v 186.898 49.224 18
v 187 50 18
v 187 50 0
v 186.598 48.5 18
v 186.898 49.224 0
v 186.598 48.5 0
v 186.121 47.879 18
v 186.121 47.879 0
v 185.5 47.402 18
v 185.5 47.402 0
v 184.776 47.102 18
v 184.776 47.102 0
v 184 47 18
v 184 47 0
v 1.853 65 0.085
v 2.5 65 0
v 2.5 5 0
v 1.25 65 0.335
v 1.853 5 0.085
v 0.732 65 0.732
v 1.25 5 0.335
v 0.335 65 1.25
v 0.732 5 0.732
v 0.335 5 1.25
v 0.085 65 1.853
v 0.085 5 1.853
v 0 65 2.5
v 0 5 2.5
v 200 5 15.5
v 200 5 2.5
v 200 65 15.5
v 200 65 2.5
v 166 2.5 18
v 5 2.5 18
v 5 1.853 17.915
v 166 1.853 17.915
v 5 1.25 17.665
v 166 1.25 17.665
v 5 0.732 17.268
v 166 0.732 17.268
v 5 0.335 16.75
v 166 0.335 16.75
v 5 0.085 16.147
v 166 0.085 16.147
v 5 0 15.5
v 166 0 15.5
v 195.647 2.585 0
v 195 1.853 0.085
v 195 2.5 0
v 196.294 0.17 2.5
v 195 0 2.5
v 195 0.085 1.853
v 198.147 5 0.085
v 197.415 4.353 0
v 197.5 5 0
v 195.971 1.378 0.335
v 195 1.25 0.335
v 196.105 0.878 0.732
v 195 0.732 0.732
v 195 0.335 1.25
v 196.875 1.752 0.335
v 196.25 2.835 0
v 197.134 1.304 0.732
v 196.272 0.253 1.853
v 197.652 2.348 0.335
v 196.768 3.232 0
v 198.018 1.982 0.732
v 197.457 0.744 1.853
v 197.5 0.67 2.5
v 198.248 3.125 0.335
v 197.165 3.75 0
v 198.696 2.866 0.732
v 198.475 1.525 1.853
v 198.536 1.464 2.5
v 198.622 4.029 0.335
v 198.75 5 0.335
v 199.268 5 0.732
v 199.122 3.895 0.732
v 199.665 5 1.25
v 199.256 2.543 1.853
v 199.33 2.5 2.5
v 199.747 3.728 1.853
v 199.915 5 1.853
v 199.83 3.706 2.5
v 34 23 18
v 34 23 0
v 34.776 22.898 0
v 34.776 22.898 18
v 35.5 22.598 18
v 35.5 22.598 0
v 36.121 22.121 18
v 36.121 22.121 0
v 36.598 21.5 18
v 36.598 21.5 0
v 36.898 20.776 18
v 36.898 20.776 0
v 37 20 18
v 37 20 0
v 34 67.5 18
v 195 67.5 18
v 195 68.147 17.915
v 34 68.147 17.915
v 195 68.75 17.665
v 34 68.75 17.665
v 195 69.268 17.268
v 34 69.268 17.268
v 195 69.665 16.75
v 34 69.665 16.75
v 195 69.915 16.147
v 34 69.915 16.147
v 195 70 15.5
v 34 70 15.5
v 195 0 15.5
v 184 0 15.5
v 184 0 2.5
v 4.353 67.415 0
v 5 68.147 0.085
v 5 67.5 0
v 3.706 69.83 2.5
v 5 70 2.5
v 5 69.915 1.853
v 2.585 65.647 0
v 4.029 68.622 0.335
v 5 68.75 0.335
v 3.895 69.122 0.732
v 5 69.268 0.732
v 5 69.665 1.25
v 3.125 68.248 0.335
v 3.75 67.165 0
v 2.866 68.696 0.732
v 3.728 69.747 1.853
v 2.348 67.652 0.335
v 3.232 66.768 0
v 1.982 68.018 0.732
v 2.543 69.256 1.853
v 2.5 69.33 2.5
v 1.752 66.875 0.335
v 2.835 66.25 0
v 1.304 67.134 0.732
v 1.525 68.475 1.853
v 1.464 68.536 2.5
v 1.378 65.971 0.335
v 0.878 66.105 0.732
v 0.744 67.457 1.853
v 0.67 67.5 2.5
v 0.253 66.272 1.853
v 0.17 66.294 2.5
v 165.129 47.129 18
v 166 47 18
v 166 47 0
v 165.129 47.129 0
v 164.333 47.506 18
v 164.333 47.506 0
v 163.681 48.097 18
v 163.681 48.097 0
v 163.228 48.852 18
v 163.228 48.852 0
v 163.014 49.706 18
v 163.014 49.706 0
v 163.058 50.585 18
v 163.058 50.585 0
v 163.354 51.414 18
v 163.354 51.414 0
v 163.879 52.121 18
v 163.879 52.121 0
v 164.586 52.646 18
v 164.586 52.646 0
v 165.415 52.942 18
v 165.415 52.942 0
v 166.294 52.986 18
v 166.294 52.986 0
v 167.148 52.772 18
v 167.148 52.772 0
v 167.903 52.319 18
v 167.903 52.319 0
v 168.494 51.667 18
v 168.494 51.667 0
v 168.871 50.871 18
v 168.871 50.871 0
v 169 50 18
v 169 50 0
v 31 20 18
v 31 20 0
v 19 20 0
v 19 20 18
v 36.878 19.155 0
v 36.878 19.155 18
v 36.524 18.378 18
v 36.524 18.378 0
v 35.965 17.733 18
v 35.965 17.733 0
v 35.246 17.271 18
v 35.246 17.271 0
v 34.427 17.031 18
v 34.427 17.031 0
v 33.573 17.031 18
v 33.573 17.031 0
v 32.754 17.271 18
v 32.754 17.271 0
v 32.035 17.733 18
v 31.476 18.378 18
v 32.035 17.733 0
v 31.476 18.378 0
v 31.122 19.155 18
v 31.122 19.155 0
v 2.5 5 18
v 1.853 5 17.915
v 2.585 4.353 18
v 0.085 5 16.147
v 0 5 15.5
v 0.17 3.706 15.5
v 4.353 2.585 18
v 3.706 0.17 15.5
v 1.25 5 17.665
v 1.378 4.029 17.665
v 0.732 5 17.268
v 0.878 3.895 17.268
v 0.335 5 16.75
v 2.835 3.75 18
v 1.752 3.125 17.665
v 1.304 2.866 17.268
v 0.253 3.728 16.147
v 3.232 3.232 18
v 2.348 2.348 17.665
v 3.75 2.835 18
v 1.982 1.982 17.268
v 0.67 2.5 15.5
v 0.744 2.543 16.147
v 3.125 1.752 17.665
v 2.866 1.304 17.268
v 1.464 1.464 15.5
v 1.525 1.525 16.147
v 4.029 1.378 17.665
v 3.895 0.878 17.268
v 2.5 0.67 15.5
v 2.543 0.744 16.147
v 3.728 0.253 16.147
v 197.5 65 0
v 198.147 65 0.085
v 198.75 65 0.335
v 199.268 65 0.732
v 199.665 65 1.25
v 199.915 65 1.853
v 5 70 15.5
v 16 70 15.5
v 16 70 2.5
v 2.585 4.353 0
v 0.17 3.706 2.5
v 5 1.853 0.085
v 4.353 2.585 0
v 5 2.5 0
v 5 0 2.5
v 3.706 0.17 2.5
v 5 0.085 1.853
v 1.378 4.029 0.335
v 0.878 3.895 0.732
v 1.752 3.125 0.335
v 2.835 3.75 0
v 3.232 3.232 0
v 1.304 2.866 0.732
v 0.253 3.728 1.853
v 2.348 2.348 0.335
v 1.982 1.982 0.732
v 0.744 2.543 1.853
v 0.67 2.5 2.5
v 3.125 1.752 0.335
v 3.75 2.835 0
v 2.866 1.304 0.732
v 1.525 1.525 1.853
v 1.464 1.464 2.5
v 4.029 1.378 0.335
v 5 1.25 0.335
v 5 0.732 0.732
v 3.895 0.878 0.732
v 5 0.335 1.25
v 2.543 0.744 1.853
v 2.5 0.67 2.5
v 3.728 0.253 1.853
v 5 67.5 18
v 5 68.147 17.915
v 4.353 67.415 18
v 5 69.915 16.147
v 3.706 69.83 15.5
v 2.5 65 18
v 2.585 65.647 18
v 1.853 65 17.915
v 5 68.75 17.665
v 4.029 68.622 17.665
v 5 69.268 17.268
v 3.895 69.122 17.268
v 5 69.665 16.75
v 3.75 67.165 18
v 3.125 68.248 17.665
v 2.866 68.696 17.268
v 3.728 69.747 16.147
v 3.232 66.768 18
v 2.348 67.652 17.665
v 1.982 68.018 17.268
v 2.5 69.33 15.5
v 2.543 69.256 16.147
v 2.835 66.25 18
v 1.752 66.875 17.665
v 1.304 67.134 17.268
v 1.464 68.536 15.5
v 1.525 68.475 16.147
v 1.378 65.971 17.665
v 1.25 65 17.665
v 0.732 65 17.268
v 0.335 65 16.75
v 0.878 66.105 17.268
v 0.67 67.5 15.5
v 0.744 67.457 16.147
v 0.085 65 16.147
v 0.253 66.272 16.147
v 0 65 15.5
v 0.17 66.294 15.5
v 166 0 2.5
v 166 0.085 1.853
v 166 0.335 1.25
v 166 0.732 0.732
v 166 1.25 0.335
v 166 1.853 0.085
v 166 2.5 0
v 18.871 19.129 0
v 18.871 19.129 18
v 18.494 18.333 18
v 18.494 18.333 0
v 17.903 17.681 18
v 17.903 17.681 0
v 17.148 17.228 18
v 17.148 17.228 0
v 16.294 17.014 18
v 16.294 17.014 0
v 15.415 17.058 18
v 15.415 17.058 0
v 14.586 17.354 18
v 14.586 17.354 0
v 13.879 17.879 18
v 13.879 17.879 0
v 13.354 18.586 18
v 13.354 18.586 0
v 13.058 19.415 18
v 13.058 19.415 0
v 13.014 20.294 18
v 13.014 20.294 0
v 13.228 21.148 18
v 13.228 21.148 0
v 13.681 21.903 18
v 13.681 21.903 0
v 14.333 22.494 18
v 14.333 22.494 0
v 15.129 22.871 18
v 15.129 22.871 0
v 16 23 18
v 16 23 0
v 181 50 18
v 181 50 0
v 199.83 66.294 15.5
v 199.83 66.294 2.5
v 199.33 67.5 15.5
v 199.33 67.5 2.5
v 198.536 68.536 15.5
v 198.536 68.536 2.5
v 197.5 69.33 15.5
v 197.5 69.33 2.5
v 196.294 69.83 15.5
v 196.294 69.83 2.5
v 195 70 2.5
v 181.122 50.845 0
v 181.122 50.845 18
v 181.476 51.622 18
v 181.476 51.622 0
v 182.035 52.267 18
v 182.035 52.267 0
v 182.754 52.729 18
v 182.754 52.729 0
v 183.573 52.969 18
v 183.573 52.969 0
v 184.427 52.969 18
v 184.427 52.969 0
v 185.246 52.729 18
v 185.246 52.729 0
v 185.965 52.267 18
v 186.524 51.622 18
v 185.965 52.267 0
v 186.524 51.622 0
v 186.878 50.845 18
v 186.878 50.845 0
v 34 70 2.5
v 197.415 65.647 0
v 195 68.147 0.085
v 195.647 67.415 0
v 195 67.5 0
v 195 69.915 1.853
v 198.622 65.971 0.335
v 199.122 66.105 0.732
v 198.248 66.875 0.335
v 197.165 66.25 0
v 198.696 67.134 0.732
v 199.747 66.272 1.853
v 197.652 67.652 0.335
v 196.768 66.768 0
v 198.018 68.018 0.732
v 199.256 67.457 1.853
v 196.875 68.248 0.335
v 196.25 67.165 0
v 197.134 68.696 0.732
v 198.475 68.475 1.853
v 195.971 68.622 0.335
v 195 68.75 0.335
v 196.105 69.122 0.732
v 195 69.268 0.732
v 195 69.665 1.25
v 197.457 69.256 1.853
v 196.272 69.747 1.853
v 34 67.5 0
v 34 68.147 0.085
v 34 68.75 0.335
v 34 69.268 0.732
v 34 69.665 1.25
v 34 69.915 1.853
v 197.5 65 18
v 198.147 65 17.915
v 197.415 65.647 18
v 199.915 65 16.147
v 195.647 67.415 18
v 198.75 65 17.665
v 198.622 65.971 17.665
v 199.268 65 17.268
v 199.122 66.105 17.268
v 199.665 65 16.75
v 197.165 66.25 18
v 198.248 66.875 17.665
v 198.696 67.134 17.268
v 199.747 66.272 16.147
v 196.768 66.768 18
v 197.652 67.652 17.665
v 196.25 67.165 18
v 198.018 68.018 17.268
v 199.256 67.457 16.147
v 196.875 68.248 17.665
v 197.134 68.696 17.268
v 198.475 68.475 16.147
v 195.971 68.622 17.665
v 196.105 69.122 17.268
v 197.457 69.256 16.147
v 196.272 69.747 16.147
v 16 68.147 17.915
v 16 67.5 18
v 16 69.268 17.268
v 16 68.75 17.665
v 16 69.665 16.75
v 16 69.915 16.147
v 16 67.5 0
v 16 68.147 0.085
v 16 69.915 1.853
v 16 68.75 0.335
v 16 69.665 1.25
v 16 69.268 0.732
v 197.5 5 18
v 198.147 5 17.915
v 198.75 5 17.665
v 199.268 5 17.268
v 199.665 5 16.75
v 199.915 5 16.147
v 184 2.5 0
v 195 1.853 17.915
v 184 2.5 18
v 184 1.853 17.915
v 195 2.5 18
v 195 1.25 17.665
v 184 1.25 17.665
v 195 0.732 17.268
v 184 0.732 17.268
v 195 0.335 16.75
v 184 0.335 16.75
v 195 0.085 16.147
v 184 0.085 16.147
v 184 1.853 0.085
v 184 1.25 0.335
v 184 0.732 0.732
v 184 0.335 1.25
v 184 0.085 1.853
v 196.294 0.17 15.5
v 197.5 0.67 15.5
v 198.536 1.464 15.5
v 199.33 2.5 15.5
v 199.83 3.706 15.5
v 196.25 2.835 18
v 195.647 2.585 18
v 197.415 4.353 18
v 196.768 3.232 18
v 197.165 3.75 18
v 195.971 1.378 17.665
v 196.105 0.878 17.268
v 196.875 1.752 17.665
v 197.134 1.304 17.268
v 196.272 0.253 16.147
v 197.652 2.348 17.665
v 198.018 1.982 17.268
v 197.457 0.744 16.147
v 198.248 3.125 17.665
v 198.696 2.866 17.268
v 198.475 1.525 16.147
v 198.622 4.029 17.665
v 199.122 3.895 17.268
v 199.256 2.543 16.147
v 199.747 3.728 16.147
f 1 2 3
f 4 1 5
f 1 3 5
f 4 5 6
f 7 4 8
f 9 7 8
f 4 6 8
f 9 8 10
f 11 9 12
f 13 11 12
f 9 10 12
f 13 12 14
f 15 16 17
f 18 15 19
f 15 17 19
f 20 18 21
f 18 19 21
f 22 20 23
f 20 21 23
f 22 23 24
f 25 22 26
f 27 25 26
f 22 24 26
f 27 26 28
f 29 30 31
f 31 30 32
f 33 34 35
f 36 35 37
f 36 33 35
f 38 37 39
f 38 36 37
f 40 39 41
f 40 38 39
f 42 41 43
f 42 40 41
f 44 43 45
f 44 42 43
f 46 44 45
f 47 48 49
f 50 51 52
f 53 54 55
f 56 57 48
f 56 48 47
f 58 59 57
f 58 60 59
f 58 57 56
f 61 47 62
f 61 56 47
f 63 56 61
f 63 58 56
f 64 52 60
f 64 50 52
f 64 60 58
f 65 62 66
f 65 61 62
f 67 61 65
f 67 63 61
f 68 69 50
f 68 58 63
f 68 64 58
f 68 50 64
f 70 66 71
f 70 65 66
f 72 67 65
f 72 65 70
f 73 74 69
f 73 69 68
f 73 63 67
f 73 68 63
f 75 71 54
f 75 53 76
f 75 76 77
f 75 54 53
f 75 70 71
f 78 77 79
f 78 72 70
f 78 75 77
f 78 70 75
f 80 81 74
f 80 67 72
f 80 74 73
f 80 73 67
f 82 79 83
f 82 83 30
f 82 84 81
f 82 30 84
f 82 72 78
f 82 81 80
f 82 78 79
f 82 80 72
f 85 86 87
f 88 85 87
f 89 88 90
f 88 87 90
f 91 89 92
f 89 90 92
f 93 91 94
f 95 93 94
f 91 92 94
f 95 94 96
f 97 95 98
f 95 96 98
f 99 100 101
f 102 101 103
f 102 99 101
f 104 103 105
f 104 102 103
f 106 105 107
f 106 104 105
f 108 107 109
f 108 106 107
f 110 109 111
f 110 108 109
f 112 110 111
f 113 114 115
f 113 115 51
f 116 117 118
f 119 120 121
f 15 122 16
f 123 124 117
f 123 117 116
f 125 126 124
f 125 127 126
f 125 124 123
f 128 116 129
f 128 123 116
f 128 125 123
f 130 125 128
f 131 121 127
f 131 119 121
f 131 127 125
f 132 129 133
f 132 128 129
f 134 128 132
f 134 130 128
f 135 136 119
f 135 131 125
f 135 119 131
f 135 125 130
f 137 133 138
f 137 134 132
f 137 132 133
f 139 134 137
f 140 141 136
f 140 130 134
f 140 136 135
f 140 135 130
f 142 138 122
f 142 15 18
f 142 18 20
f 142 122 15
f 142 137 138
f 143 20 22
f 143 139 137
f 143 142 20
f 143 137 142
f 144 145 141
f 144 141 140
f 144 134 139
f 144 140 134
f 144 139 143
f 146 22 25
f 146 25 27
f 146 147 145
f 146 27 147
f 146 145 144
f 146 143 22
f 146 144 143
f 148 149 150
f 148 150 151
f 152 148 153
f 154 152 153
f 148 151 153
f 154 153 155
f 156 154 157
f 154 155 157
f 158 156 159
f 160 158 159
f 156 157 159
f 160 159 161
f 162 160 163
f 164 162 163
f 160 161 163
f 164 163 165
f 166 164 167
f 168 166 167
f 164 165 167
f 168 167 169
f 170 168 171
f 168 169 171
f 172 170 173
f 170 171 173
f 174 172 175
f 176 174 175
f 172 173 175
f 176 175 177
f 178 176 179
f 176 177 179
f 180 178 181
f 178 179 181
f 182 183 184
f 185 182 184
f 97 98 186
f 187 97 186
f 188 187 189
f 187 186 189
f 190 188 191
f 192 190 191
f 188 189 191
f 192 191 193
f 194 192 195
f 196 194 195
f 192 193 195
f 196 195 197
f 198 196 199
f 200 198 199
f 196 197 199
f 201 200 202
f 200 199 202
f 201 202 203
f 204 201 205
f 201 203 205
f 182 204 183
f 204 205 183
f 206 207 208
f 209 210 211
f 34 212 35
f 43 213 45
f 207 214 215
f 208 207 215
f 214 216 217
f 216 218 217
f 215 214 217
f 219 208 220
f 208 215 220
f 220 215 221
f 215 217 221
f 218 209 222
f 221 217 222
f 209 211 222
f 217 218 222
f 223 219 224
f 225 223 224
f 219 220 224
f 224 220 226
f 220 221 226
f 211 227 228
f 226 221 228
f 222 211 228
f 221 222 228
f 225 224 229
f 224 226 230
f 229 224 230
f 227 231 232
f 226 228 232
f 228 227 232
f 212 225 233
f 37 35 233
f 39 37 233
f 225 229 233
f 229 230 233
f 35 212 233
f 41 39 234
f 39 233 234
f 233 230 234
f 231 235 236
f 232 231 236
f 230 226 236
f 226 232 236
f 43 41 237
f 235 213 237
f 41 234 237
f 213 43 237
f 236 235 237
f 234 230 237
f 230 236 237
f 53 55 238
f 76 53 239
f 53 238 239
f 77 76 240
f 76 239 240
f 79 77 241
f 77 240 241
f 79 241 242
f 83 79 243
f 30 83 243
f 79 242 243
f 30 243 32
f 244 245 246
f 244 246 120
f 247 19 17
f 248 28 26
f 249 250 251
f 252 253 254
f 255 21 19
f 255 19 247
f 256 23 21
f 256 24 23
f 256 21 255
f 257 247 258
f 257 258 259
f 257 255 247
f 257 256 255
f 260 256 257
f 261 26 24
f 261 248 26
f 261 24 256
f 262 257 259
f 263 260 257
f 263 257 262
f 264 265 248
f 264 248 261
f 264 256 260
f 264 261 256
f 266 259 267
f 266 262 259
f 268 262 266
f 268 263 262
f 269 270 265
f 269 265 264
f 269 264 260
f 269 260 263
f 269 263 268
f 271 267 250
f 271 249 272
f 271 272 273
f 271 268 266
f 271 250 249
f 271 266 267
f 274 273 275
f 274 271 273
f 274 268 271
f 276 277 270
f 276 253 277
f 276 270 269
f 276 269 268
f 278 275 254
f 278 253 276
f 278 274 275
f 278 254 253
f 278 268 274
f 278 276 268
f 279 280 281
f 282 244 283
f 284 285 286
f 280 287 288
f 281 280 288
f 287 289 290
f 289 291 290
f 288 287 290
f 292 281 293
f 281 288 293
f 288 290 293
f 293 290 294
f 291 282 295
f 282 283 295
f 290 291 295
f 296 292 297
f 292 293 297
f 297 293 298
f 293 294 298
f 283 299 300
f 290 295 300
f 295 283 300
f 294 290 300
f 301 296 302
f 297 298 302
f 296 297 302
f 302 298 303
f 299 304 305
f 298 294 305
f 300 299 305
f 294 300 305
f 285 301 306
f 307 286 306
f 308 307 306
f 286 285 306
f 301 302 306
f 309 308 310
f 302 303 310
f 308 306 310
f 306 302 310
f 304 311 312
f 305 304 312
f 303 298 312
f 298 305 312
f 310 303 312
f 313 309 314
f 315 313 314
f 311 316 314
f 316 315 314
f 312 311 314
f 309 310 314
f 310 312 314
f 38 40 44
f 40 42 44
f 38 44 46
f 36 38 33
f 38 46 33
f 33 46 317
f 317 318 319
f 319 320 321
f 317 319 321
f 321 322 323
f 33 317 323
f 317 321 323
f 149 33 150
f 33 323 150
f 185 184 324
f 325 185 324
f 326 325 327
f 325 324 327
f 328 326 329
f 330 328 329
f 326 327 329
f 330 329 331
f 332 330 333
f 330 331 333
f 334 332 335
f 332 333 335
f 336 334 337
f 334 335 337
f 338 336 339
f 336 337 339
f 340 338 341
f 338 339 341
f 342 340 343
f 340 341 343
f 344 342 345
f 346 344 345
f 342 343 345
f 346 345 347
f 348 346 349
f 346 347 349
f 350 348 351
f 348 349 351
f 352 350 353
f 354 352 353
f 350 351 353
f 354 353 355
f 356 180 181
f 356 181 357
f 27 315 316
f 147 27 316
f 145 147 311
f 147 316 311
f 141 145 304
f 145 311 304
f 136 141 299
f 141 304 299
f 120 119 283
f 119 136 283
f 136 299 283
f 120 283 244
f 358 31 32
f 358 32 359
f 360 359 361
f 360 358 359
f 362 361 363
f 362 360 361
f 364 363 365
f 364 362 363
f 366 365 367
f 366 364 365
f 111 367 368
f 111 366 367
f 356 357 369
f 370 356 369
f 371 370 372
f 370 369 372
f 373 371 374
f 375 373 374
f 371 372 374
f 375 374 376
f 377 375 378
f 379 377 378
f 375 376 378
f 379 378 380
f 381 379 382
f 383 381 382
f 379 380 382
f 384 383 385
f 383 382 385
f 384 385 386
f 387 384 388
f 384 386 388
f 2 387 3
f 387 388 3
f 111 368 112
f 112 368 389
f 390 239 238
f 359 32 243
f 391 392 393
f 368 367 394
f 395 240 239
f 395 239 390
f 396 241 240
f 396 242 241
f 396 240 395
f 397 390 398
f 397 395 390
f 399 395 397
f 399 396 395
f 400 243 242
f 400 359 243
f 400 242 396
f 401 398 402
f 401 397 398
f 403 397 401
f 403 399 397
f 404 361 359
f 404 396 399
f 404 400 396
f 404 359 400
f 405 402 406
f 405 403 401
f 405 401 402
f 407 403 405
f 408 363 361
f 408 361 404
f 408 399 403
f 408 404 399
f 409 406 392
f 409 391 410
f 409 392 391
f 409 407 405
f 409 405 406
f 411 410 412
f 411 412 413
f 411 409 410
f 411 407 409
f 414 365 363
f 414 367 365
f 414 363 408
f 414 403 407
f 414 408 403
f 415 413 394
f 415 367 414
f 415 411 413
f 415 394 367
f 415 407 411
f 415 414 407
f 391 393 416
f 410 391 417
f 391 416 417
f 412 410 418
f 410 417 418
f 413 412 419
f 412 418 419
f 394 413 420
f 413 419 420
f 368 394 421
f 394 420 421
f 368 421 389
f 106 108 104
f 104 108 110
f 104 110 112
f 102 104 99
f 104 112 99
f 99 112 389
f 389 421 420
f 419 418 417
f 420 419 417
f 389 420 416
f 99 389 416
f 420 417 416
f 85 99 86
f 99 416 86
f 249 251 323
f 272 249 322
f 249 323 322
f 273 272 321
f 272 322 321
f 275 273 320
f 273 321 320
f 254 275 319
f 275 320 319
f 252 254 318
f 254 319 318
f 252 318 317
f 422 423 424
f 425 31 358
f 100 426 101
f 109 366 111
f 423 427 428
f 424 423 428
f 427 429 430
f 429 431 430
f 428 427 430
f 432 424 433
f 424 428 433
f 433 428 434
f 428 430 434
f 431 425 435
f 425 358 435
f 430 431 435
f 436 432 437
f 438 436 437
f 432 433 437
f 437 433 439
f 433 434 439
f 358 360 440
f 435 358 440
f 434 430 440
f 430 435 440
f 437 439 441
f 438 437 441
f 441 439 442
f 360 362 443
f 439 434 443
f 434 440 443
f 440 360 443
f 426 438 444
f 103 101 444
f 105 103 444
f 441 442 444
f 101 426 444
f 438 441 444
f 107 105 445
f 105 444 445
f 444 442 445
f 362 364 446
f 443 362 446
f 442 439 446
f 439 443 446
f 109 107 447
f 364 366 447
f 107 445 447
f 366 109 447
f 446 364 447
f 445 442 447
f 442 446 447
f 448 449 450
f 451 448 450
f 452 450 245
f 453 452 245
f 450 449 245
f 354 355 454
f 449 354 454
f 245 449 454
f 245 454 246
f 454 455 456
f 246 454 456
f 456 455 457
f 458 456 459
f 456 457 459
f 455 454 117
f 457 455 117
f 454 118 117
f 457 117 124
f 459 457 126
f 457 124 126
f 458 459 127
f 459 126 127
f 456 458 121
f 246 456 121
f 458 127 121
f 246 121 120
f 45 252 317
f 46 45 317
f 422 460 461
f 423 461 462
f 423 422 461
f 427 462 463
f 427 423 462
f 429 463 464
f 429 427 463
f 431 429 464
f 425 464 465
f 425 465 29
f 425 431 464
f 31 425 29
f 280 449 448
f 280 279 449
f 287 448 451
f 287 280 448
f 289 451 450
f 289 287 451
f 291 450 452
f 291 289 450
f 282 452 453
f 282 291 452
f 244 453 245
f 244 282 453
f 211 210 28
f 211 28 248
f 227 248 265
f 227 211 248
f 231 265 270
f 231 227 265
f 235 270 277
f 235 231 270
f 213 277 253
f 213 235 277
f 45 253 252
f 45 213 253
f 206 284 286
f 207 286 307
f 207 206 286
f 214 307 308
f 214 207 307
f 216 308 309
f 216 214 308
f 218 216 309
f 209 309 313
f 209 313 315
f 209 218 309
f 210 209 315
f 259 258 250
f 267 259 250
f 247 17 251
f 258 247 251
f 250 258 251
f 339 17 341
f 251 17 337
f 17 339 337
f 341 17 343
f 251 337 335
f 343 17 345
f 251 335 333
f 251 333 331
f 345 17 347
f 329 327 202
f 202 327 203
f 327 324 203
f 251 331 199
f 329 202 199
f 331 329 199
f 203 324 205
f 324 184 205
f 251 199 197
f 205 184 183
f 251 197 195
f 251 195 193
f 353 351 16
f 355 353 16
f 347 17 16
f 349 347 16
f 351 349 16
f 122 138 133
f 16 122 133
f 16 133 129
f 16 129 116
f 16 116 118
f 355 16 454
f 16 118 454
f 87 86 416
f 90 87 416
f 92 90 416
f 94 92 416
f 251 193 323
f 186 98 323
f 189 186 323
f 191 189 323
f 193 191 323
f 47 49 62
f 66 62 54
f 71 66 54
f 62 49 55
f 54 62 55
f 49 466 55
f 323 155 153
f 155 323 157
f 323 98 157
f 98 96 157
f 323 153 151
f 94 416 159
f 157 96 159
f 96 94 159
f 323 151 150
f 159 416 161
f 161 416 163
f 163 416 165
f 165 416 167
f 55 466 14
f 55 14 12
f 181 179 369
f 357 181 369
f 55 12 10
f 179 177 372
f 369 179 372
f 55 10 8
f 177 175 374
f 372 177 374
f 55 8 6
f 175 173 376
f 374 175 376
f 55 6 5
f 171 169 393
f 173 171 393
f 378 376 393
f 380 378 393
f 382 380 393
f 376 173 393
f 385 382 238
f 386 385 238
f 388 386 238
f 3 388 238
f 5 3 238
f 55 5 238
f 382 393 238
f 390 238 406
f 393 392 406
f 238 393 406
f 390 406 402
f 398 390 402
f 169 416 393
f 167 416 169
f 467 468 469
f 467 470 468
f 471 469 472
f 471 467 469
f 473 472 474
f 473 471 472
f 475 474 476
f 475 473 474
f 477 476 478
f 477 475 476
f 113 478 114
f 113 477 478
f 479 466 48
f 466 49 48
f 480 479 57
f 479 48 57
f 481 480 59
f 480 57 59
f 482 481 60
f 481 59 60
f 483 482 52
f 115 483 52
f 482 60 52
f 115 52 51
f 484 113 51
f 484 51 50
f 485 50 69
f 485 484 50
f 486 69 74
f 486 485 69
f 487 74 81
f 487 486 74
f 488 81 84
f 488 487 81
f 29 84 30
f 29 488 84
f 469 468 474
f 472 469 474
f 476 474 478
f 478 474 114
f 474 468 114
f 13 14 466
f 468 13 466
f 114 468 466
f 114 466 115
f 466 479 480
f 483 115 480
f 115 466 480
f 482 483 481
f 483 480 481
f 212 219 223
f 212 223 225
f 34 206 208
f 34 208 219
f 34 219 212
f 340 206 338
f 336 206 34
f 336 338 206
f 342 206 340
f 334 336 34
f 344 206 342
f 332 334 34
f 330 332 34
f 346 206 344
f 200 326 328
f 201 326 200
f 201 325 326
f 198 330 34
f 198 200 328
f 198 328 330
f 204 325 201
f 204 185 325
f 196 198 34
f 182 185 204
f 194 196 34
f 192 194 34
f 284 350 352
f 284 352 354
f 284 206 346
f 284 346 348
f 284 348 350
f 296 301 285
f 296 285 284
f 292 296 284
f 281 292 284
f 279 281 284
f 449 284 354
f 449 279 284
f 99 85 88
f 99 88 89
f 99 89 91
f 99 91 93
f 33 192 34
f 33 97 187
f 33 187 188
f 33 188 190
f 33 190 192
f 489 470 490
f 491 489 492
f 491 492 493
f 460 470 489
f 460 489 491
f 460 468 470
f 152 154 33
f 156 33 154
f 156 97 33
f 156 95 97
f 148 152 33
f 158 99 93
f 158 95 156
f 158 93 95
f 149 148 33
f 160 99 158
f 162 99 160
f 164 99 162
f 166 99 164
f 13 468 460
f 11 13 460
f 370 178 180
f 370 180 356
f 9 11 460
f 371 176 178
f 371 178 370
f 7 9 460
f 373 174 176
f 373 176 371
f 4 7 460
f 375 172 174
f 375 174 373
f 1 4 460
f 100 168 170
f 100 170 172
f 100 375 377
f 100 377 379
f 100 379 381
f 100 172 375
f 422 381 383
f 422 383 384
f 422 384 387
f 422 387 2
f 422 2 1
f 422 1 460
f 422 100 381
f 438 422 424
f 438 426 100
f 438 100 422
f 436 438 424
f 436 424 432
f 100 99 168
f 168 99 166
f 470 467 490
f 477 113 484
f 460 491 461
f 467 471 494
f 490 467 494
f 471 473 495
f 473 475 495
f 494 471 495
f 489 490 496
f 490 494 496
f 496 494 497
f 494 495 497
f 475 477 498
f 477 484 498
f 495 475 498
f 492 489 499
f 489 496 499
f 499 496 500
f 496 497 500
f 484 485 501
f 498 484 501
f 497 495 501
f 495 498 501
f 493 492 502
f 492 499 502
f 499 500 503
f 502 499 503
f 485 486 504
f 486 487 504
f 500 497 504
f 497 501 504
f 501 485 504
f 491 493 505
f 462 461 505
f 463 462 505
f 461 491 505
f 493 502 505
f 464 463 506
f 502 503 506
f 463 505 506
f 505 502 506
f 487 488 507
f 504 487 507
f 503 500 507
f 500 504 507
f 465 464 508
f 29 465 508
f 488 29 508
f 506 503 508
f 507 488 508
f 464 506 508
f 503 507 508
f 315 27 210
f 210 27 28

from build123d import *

# Parameters (mm, degrees)
F1_DEPTH = 18
F2_R     = 5
F3_R     = 2.5


with BuildPart() as f1:
    # F0 (on Top) → F1 (new body)
    with BuildSketch(Plane.XY):
        with BuildLine():
            Line((0, 70), (0, 0))
            Line((0, 0), (166, 0))
            Line((166, 0), (166, 47))
            ThreePointArc((166, 47), (163.87868, 52.12132), (169, 50))
            Line((169, 50), (181, 50))
            ThreePointArc((181, 50), (184, 53), (187, 50))
            ThreePointArc((187, 50), (186.12132, 47.87868), (184, 47))
            Line((184, 47), (184, 0))
            Line((184, 0), (200, 0))
            Line((200, 0), (200, 70))
            Line((200, 70), (34, 70))
            Line((34, 70), (34, 23))
            ThreePointArc((34, 23), (36.12132, 22.12132), (37, 20))
            ThreePointArc((37, 20), (34, 17), (31, 20))
            Line((31, 20), (19, 20))
            ThreePointArc((19, 20), (13.87868, 17.87868), (16, 23))
            Line((16, 23), (16, 70))
            Line((16, 70), (0, 70))
        make_face()
    extrude(amount=F1_DEPTH)

    # F2
    f2_edges = [f1.edges().sort_by_distance(p)[0] for p in [
        (0, 0, 9),
        (200, 70, 9),
        (200, 0, 9),
        (0, 70, 9),
    ]]
    fillet(f2_edges, radius=F2_R)

    # F3
    f3_edges = [f1.edges().sort_by_distance(p)[0] for p in [
        (85.5, 0, 18),
        (85.5, 0, 0),
        (114.5, 70, 18),
        (200, 35, 0),
    ]]
    fillet(f3_edges, radius=F3_R)


solid = f1.part
